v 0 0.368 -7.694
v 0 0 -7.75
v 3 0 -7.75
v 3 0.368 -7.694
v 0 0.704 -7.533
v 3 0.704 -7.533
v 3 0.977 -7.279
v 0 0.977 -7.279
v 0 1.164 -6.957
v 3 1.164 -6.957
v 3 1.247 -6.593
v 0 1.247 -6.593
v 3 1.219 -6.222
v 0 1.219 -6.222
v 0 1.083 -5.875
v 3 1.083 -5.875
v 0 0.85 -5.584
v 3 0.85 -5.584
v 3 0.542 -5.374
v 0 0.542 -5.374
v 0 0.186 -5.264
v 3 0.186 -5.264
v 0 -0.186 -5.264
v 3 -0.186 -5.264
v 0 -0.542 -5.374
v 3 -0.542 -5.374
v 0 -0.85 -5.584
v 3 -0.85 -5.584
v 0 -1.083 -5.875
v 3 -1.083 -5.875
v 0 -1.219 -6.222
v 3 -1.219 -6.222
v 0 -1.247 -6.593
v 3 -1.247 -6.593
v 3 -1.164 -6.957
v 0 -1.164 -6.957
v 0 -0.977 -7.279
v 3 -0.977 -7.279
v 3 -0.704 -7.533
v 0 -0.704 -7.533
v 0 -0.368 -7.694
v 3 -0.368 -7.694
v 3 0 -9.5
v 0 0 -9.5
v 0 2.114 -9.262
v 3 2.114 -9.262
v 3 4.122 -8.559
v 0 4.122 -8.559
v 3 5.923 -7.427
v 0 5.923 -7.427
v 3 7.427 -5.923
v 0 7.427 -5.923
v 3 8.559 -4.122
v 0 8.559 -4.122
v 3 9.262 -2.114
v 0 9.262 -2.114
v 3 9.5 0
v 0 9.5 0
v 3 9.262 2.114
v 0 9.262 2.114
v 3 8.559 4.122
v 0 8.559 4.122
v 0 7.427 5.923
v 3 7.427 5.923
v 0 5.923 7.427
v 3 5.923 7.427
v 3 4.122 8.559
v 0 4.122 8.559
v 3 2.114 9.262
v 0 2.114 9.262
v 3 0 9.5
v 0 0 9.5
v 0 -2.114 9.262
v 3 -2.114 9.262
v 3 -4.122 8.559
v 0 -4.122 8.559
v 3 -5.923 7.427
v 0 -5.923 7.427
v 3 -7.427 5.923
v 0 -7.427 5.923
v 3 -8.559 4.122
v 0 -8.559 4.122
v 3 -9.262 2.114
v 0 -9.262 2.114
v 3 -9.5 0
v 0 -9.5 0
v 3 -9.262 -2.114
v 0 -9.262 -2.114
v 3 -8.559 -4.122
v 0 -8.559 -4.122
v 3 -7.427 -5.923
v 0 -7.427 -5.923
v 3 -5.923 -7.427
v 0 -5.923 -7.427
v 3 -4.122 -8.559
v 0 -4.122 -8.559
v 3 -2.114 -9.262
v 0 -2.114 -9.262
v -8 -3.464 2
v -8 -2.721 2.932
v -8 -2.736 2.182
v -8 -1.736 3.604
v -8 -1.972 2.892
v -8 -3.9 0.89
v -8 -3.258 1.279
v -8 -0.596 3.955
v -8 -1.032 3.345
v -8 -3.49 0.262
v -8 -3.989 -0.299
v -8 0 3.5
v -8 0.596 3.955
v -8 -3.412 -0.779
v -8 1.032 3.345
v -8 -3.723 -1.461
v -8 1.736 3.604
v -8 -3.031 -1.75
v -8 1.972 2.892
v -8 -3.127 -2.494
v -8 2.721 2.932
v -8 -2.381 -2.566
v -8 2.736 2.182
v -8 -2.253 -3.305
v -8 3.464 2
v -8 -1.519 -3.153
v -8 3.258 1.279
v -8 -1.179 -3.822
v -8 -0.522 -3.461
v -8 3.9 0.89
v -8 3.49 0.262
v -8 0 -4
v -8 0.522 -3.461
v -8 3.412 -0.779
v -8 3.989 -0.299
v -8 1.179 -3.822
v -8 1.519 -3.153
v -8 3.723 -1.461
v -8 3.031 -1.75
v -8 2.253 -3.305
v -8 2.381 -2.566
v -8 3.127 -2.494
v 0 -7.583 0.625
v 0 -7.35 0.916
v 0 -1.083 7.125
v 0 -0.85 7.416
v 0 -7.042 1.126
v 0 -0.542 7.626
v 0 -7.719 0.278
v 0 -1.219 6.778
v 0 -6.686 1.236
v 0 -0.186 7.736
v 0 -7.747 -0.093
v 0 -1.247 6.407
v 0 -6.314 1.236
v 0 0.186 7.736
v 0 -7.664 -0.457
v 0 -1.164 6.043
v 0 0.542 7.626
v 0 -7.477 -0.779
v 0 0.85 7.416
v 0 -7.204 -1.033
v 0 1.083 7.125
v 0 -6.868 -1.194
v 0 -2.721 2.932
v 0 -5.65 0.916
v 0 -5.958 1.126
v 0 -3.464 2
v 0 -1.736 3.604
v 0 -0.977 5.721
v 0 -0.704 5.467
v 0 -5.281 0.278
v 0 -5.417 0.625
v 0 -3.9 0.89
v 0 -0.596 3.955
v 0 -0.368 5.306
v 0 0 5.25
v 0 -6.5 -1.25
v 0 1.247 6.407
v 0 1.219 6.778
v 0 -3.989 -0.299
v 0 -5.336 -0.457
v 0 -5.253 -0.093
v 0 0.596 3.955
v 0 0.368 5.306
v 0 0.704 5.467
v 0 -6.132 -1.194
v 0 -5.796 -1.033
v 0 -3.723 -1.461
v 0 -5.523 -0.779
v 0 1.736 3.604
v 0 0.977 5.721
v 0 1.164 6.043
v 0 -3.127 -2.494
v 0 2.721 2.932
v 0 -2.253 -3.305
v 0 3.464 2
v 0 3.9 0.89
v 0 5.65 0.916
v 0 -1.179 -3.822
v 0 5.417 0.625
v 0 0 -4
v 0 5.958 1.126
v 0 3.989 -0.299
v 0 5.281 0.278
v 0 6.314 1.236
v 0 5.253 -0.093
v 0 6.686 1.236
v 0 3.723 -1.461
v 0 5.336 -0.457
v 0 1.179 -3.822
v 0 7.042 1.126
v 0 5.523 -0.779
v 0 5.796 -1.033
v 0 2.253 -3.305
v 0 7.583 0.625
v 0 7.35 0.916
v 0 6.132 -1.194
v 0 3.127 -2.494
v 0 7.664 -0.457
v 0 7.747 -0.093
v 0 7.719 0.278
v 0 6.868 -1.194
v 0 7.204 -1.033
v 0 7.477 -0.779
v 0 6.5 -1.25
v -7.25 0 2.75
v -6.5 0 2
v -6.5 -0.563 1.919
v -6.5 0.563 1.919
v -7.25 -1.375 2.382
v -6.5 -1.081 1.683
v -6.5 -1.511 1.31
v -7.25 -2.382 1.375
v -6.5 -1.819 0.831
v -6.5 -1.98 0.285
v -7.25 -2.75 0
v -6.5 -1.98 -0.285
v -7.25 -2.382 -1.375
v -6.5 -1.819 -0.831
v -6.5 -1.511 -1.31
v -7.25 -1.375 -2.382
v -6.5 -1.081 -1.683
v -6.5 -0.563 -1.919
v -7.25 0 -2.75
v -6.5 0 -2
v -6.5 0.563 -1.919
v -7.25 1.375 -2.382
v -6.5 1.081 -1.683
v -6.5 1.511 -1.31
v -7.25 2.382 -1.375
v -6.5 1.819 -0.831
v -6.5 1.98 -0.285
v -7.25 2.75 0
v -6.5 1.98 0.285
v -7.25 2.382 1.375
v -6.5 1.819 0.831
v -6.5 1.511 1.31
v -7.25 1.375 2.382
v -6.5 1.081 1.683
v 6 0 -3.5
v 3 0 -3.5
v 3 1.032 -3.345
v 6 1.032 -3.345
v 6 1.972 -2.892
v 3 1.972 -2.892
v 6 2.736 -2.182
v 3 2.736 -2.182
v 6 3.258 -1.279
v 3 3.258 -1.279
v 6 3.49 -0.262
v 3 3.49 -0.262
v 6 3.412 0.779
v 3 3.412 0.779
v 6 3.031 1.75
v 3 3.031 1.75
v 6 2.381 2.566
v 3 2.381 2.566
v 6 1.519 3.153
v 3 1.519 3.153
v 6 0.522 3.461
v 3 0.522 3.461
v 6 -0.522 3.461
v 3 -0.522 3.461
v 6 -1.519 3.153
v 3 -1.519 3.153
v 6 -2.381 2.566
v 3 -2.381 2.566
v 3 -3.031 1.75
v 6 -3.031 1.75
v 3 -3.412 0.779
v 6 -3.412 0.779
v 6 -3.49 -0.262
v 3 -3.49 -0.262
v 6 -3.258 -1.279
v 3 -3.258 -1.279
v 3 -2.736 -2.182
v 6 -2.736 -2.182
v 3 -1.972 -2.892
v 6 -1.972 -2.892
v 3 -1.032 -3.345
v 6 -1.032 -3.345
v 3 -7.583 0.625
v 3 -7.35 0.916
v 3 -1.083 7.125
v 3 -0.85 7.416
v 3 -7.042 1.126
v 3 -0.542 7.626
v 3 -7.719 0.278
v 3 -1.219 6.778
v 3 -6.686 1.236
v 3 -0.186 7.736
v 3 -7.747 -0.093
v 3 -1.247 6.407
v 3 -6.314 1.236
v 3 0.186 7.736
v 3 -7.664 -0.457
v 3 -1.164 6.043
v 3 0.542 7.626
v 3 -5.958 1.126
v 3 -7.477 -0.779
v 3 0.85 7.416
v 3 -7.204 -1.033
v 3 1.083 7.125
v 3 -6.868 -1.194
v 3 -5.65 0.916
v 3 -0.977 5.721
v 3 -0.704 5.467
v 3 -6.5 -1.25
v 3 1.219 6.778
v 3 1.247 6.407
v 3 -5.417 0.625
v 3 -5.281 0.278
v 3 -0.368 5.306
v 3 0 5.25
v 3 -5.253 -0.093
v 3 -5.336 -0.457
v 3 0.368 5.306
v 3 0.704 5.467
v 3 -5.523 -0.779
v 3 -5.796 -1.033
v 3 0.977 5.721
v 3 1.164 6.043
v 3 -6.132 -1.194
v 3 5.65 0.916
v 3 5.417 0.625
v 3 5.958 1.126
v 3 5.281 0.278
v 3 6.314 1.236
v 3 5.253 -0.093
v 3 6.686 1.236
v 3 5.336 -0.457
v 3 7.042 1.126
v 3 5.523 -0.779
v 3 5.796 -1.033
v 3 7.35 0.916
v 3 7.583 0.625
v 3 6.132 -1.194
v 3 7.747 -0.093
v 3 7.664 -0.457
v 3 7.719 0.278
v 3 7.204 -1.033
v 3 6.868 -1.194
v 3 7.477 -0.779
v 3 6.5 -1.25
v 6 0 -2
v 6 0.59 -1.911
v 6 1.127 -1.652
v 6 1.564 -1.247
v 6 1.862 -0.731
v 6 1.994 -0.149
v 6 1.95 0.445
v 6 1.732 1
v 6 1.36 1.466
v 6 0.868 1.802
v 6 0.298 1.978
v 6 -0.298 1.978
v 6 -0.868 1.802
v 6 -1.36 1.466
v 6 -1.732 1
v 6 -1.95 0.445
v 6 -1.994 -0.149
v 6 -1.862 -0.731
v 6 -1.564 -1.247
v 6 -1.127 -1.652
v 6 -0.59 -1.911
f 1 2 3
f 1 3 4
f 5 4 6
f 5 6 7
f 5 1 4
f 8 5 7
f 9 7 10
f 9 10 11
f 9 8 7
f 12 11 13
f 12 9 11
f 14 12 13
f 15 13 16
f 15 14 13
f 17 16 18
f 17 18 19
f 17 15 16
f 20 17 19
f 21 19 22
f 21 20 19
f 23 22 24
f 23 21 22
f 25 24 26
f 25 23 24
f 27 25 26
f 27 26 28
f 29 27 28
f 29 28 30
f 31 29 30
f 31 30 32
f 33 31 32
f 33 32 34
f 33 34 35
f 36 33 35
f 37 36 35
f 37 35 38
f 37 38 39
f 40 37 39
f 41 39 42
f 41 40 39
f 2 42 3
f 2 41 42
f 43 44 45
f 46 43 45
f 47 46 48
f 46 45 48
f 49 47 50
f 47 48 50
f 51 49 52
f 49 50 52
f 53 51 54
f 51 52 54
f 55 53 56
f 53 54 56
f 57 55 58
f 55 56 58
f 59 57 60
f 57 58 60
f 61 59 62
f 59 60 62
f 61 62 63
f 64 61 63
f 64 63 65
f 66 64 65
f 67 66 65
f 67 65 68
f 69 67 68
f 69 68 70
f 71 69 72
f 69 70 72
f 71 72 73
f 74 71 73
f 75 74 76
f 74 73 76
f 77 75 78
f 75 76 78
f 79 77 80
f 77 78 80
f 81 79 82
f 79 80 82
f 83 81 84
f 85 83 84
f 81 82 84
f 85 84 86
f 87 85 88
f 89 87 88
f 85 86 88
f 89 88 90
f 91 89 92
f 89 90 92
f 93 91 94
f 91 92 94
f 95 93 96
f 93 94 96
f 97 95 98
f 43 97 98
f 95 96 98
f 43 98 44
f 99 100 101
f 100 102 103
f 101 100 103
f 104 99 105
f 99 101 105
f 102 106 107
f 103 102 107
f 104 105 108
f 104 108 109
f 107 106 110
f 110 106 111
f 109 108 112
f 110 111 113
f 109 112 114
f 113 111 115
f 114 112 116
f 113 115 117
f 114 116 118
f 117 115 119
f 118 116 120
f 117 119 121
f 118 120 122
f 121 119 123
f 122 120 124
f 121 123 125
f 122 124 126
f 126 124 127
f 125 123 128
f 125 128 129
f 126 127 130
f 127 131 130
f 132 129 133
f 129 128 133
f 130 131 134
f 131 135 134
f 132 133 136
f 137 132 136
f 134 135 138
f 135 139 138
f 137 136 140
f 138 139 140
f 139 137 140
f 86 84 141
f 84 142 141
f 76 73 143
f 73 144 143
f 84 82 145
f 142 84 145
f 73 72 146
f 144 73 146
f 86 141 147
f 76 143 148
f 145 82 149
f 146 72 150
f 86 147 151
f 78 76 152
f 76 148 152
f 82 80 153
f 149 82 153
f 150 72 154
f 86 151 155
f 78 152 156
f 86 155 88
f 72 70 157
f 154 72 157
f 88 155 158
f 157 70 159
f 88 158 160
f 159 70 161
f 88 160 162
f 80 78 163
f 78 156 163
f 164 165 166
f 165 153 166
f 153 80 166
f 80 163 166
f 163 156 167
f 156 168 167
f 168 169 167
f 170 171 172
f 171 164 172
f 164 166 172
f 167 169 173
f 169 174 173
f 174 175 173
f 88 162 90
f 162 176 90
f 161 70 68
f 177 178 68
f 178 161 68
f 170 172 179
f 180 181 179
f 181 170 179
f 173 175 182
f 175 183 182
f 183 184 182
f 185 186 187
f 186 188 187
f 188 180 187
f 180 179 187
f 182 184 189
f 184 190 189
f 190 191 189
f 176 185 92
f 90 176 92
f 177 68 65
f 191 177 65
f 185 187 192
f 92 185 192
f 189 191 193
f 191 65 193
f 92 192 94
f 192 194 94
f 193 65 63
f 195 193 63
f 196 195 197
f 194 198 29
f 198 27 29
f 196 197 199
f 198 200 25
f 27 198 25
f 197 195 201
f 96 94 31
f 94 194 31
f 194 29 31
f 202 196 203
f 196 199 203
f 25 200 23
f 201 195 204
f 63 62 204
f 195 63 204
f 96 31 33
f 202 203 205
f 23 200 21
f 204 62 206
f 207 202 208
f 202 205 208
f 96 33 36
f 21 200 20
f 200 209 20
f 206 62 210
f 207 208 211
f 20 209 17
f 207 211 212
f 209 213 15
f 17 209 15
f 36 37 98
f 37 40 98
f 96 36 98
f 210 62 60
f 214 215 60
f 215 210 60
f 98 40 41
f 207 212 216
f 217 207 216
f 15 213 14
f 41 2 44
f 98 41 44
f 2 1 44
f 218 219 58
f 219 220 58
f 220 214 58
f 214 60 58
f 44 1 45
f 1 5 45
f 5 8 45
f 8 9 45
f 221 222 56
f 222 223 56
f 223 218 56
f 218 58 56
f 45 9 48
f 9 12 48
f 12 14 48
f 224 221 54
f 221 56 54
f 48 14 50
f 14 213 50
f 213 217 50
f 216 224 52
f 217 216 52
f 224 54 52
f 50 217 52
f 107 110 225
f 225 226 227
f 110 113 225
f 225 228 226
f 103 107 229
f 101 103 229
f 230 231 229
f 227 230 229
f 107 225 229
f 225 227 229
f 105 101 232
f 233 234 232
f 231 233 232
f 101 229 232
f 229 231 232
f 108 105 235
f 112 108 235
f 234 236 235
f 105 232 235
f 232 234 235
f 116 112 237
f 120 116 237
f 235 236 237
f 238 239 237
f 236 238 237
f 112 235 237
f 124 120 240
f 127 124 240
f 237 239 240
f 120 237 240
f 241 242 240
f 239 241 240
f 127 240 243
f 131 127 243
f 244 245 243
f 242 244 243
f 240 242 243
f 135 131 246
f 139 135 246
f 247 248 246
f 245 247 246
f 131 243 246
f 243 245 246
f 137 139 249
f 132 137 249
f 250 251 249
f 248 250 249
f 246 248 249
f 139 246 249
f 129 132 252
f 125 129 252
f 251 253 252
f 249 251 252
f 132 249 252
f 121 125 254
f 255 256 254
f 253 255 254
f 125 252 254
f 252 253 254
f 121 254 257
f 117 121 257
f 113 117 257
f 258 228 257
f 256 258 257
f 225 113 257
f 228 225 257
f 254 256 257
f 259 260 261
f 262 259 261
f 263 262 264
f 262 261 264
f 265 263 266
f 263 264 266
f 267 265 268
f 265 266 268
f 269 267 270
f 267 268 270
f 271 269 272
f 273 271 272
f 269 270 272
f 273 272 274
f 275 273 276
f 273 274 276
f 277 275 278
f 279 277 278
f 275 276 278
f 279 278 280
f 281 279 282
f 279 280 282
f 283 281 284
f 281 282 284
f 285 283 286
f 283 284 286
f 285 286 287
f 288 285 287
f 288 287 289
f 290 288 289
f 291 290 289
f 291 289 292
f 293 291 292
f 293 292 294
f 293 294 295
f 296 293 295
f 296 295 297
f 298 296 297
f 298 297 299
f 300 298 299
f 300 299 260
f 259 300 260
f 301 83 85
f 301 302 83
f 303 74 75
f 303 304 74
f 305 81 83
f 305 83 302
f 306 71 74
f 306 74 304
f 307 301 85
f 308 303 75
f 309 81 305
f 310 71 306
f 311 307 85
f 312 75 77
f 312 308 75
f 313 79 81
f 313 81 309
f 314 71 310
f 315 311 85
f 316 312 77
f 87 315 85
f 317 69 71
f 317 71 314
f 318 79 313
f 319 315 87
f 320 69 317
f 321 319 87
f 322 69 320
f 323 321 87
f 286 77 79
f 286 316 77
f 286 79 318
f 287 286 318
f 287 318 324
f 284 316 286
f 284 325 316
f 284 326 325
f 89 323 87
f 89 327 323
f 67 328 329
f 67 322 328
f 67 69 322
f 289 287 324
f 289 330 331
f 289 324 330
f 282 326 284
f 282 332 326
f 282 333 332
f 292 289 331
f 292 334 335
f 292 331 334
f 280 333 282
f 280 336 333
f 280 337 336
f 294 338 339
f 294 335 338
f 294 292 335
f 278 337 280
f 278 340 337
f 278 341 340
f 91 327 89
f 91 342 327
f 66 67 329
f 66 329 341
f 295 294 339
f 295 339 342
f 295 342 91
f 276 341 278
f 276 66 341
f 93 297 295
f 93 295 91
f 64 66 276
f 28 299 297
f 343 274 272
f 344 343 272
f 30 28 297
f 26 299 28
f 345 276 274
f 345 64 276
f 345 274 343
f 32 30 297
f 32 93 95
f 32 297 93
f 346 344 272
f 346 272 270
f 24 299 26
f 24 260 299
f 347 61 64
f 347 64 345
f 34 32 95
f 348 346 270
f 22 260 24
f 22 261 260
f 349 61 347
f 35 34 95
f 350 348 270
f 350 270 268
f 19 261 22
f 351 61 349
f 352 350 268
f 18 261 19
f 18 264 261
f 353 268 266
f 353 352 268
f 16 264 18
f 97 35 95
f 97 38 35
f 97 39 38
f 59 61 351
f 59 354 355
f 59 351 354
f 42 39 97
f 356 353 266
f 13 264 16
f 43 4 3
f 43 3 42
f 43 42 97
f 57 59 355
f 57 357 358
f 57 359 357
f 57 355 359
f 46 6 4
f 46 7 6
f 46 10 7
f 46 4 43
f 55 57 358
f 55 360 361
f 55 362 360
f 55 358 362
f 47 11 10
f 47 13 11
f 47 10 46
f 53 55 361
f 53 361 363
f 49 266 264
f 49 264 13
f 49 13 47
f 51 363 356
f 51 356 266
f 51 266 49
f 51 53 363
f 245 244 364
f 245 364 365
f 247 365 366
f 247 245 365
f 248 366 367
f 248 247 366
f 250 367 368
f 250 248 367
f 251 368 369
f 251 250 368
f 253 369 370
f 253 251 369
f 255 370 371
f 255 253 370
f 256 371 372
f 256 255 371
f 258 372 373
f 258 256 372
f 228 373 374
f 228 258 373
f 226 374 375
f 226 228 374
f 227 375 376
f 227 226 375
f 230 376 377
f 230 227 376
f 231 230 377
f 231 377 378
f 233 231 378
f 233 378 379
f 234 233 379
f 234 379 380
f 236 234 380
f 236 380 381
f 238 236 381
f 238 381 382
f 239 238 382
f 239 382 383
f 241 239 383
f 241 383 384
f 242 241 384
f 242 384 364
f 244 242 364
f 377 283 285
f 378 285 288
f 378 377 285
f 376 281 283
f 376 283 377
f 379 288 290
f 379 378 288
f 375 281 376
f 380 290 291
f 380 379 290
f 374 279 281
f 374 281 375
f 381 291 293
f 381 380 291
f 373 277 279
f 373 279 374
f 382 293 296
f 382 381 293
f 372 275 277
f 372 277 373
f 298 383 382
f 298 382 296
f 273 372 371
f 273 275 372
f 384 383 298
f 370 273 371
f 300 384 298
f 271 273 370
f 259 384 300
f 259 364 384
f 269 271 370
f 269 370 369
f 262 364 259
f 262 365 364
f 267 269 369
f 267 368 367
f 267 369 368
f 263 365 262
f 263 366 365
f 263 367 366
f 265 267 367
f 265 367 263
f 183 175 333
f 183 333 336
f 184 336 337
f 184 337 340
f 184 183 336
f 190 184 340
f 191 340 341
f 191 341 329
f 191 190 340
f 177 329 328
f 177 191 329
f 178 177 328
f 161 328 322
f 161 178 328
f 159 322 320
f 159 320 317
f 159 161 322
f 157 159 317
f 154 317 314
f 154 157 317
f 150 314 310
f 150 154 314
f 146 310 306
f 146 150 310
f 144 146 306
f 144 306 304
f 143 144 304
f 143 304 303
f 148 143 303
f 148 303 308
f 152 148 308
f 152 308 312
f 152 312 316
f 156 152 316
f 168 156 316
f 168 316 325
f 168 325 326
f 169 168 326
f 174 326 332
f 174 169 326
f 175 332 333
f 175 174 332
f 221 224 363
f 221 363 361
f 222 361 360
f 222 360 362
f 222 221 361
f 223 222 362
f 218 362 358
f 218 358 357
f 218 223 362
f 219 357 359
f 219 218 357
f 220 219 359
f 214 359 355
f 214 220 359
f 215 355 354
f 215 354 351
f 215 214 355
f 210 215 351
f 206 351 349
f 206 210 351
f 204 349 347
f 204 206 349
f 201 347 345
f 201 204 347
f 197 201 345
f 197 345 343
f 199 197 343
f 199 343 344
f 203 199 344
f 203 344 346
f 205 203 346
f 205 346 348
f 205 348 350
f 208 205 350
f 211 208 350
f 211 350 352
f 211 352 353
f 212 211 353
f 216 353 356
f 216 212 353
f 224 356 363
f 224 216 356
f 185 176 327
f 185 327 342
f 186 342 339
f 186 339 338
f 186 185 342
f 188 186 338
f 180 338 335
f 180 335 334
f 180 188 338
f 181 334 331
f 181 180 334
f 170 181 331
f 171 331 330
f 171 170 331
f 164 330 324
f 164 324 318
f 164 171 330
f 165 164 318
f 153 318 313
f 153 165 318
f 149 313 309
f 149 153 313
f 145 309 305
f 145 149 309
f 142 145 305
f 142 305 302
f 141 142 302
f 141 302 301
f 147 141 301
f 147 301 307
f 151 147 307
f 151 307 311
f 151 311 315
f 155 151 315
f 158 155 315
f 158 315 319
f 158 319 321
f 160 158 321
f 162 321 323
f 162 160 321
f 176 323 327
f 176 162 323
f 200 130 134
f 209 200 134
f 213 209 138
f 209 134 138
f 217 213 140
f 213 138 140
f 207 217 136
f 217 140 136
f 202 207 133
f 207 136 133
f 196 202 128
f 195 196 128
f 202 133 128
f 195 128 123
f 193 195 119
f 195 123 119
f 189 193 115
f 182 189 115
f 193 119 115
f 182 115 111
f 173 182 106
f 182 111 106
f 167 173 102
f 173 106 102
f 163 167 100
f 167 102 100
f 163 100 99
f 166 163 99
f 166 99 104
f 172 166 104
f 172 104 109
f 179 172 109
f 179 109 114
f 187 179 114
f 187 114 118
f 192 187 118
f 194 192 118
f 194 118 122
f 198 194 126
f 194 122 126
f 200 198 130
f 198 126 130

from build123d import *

# Parameters (mm, degrees)
SKETCH1_R           = 9.5
SKETCH1_R_2         = 1.25
SKETCH1_R_3         = 4
SKETCH1_R_4         = 3.5
BOSS_EXTRUDE1_DEPTH = 3
SKETCH1_3_R         = 3.5
SKETCH1_3_R_2       = 2
BOSS_EXTRUDE2_DEPTH = 6
BOSS_EXTRUDE3_START = -8
SKETCH1_4_R         = 4
SKETCH1_4_R_2       = 3.5
SKETCH1_4_R_3       = 2
BOSS_EXTRUDE3_DEPTH = 8


with BuildPart() as part:
    # Sketch1 → Boss-Extrude1 (new body)
    # profile 1 of 2: a face of its own
    with BuildSketch(Plane(origin=(0, 0, 0), x_dir=(0, 0, -1), z_dir=(1, 0, 0))):
        Circle(SKETCH1_R)
        with Locations((-6.5, 0)):
            Circle(SKETCH1_R_2, mode=Mode.SUBTRACT)
        with Locations((0, -6.5)):
            Circle(SKETCH1_R_2, mode=Mode.SUBTRACT)
        with Locations((6.5, 0)):
            Circle(SKETCH1_R_2, mode=Mode.SUBTRACT)
        with Locations((0, 6.5)):
            Circle(SKETCH1_R_2, mode=Mode.SUBTRACT)
        Circle(SKETCH1_R_3, mode=Mode.SUBTRACT)
    # profile 2 of 2: a face of its own
    with BuildSketch(Plane(origin=(0, 0, 0), x_dir=(0, 0, -1), z_dir=(1, 0, 0))):
        Circle(SKETCH1_R_3)
        Circle(SKETCH1_R_4, mode=Mode.SUBTRACT)
    extrude(amount=BOSS_EXTRUDE1_DEPTH)

    # Sketch1<3> → Boss-Extrude2 (add)
    with BuildSketch(Plane(origin=(0, 0, 0), x_dir=(0, 0, -1), z_dir=(1, 0, 0))):
        Circle(SKETCH1_3_R)
        Circle(SKETCH1_3_R_2, mode=Mode.SUBTRACT)
    extrude(amount=BOSS_EXTRUDE2_DEPTH)

    # Sketch1<4> → Boss-Extrude3 (add)
    # profile 1 of 2: a face of its own
    with BuildSketch(Plane(origin=(0, 0, 0), x_dir=(0, 0, -1), z_dir=(1, 0, 0)).offset(BOSS_EXTRUDE3_START)):
        Circle(SKETCH1_4_R)
        Circle(SKETCH1_4_R_2, mode=Mode.SUBTRACT)
    # profile 2 of 2: a face of its own
    with BuildSketch(Plane(origin=(0, 0, 0), x_dir=(0, 0, -1), z_dir=(1, 0, 0)).offset(BOSS_EXTRUDE3_START)):
        Circle(SKETCH1_4_R_2)
        Circle(SKETCH1_4_R_3, mode=Mode.SUBTRACT)
    extrude(amount=BOSS_EXTRUDE3_DEPTH)

    # Cut-Extrude1 cone 1 section (through the dimple's axis) → Cut-Extrude1 (revolve, cut)
    with BuildSketch(Plane(origin=(-8, 0, 0), x_dir=(0, 0, 1), z_dir=(0, 1, 0))):
        Polygon((0, 0), (3.5, 0), (0, 3.5), align=None)
    revolve(axis=Axis((-8, 0, 0), (1, 0, 0)), mode=Mode.SUBTRACT)


solid = part.part
